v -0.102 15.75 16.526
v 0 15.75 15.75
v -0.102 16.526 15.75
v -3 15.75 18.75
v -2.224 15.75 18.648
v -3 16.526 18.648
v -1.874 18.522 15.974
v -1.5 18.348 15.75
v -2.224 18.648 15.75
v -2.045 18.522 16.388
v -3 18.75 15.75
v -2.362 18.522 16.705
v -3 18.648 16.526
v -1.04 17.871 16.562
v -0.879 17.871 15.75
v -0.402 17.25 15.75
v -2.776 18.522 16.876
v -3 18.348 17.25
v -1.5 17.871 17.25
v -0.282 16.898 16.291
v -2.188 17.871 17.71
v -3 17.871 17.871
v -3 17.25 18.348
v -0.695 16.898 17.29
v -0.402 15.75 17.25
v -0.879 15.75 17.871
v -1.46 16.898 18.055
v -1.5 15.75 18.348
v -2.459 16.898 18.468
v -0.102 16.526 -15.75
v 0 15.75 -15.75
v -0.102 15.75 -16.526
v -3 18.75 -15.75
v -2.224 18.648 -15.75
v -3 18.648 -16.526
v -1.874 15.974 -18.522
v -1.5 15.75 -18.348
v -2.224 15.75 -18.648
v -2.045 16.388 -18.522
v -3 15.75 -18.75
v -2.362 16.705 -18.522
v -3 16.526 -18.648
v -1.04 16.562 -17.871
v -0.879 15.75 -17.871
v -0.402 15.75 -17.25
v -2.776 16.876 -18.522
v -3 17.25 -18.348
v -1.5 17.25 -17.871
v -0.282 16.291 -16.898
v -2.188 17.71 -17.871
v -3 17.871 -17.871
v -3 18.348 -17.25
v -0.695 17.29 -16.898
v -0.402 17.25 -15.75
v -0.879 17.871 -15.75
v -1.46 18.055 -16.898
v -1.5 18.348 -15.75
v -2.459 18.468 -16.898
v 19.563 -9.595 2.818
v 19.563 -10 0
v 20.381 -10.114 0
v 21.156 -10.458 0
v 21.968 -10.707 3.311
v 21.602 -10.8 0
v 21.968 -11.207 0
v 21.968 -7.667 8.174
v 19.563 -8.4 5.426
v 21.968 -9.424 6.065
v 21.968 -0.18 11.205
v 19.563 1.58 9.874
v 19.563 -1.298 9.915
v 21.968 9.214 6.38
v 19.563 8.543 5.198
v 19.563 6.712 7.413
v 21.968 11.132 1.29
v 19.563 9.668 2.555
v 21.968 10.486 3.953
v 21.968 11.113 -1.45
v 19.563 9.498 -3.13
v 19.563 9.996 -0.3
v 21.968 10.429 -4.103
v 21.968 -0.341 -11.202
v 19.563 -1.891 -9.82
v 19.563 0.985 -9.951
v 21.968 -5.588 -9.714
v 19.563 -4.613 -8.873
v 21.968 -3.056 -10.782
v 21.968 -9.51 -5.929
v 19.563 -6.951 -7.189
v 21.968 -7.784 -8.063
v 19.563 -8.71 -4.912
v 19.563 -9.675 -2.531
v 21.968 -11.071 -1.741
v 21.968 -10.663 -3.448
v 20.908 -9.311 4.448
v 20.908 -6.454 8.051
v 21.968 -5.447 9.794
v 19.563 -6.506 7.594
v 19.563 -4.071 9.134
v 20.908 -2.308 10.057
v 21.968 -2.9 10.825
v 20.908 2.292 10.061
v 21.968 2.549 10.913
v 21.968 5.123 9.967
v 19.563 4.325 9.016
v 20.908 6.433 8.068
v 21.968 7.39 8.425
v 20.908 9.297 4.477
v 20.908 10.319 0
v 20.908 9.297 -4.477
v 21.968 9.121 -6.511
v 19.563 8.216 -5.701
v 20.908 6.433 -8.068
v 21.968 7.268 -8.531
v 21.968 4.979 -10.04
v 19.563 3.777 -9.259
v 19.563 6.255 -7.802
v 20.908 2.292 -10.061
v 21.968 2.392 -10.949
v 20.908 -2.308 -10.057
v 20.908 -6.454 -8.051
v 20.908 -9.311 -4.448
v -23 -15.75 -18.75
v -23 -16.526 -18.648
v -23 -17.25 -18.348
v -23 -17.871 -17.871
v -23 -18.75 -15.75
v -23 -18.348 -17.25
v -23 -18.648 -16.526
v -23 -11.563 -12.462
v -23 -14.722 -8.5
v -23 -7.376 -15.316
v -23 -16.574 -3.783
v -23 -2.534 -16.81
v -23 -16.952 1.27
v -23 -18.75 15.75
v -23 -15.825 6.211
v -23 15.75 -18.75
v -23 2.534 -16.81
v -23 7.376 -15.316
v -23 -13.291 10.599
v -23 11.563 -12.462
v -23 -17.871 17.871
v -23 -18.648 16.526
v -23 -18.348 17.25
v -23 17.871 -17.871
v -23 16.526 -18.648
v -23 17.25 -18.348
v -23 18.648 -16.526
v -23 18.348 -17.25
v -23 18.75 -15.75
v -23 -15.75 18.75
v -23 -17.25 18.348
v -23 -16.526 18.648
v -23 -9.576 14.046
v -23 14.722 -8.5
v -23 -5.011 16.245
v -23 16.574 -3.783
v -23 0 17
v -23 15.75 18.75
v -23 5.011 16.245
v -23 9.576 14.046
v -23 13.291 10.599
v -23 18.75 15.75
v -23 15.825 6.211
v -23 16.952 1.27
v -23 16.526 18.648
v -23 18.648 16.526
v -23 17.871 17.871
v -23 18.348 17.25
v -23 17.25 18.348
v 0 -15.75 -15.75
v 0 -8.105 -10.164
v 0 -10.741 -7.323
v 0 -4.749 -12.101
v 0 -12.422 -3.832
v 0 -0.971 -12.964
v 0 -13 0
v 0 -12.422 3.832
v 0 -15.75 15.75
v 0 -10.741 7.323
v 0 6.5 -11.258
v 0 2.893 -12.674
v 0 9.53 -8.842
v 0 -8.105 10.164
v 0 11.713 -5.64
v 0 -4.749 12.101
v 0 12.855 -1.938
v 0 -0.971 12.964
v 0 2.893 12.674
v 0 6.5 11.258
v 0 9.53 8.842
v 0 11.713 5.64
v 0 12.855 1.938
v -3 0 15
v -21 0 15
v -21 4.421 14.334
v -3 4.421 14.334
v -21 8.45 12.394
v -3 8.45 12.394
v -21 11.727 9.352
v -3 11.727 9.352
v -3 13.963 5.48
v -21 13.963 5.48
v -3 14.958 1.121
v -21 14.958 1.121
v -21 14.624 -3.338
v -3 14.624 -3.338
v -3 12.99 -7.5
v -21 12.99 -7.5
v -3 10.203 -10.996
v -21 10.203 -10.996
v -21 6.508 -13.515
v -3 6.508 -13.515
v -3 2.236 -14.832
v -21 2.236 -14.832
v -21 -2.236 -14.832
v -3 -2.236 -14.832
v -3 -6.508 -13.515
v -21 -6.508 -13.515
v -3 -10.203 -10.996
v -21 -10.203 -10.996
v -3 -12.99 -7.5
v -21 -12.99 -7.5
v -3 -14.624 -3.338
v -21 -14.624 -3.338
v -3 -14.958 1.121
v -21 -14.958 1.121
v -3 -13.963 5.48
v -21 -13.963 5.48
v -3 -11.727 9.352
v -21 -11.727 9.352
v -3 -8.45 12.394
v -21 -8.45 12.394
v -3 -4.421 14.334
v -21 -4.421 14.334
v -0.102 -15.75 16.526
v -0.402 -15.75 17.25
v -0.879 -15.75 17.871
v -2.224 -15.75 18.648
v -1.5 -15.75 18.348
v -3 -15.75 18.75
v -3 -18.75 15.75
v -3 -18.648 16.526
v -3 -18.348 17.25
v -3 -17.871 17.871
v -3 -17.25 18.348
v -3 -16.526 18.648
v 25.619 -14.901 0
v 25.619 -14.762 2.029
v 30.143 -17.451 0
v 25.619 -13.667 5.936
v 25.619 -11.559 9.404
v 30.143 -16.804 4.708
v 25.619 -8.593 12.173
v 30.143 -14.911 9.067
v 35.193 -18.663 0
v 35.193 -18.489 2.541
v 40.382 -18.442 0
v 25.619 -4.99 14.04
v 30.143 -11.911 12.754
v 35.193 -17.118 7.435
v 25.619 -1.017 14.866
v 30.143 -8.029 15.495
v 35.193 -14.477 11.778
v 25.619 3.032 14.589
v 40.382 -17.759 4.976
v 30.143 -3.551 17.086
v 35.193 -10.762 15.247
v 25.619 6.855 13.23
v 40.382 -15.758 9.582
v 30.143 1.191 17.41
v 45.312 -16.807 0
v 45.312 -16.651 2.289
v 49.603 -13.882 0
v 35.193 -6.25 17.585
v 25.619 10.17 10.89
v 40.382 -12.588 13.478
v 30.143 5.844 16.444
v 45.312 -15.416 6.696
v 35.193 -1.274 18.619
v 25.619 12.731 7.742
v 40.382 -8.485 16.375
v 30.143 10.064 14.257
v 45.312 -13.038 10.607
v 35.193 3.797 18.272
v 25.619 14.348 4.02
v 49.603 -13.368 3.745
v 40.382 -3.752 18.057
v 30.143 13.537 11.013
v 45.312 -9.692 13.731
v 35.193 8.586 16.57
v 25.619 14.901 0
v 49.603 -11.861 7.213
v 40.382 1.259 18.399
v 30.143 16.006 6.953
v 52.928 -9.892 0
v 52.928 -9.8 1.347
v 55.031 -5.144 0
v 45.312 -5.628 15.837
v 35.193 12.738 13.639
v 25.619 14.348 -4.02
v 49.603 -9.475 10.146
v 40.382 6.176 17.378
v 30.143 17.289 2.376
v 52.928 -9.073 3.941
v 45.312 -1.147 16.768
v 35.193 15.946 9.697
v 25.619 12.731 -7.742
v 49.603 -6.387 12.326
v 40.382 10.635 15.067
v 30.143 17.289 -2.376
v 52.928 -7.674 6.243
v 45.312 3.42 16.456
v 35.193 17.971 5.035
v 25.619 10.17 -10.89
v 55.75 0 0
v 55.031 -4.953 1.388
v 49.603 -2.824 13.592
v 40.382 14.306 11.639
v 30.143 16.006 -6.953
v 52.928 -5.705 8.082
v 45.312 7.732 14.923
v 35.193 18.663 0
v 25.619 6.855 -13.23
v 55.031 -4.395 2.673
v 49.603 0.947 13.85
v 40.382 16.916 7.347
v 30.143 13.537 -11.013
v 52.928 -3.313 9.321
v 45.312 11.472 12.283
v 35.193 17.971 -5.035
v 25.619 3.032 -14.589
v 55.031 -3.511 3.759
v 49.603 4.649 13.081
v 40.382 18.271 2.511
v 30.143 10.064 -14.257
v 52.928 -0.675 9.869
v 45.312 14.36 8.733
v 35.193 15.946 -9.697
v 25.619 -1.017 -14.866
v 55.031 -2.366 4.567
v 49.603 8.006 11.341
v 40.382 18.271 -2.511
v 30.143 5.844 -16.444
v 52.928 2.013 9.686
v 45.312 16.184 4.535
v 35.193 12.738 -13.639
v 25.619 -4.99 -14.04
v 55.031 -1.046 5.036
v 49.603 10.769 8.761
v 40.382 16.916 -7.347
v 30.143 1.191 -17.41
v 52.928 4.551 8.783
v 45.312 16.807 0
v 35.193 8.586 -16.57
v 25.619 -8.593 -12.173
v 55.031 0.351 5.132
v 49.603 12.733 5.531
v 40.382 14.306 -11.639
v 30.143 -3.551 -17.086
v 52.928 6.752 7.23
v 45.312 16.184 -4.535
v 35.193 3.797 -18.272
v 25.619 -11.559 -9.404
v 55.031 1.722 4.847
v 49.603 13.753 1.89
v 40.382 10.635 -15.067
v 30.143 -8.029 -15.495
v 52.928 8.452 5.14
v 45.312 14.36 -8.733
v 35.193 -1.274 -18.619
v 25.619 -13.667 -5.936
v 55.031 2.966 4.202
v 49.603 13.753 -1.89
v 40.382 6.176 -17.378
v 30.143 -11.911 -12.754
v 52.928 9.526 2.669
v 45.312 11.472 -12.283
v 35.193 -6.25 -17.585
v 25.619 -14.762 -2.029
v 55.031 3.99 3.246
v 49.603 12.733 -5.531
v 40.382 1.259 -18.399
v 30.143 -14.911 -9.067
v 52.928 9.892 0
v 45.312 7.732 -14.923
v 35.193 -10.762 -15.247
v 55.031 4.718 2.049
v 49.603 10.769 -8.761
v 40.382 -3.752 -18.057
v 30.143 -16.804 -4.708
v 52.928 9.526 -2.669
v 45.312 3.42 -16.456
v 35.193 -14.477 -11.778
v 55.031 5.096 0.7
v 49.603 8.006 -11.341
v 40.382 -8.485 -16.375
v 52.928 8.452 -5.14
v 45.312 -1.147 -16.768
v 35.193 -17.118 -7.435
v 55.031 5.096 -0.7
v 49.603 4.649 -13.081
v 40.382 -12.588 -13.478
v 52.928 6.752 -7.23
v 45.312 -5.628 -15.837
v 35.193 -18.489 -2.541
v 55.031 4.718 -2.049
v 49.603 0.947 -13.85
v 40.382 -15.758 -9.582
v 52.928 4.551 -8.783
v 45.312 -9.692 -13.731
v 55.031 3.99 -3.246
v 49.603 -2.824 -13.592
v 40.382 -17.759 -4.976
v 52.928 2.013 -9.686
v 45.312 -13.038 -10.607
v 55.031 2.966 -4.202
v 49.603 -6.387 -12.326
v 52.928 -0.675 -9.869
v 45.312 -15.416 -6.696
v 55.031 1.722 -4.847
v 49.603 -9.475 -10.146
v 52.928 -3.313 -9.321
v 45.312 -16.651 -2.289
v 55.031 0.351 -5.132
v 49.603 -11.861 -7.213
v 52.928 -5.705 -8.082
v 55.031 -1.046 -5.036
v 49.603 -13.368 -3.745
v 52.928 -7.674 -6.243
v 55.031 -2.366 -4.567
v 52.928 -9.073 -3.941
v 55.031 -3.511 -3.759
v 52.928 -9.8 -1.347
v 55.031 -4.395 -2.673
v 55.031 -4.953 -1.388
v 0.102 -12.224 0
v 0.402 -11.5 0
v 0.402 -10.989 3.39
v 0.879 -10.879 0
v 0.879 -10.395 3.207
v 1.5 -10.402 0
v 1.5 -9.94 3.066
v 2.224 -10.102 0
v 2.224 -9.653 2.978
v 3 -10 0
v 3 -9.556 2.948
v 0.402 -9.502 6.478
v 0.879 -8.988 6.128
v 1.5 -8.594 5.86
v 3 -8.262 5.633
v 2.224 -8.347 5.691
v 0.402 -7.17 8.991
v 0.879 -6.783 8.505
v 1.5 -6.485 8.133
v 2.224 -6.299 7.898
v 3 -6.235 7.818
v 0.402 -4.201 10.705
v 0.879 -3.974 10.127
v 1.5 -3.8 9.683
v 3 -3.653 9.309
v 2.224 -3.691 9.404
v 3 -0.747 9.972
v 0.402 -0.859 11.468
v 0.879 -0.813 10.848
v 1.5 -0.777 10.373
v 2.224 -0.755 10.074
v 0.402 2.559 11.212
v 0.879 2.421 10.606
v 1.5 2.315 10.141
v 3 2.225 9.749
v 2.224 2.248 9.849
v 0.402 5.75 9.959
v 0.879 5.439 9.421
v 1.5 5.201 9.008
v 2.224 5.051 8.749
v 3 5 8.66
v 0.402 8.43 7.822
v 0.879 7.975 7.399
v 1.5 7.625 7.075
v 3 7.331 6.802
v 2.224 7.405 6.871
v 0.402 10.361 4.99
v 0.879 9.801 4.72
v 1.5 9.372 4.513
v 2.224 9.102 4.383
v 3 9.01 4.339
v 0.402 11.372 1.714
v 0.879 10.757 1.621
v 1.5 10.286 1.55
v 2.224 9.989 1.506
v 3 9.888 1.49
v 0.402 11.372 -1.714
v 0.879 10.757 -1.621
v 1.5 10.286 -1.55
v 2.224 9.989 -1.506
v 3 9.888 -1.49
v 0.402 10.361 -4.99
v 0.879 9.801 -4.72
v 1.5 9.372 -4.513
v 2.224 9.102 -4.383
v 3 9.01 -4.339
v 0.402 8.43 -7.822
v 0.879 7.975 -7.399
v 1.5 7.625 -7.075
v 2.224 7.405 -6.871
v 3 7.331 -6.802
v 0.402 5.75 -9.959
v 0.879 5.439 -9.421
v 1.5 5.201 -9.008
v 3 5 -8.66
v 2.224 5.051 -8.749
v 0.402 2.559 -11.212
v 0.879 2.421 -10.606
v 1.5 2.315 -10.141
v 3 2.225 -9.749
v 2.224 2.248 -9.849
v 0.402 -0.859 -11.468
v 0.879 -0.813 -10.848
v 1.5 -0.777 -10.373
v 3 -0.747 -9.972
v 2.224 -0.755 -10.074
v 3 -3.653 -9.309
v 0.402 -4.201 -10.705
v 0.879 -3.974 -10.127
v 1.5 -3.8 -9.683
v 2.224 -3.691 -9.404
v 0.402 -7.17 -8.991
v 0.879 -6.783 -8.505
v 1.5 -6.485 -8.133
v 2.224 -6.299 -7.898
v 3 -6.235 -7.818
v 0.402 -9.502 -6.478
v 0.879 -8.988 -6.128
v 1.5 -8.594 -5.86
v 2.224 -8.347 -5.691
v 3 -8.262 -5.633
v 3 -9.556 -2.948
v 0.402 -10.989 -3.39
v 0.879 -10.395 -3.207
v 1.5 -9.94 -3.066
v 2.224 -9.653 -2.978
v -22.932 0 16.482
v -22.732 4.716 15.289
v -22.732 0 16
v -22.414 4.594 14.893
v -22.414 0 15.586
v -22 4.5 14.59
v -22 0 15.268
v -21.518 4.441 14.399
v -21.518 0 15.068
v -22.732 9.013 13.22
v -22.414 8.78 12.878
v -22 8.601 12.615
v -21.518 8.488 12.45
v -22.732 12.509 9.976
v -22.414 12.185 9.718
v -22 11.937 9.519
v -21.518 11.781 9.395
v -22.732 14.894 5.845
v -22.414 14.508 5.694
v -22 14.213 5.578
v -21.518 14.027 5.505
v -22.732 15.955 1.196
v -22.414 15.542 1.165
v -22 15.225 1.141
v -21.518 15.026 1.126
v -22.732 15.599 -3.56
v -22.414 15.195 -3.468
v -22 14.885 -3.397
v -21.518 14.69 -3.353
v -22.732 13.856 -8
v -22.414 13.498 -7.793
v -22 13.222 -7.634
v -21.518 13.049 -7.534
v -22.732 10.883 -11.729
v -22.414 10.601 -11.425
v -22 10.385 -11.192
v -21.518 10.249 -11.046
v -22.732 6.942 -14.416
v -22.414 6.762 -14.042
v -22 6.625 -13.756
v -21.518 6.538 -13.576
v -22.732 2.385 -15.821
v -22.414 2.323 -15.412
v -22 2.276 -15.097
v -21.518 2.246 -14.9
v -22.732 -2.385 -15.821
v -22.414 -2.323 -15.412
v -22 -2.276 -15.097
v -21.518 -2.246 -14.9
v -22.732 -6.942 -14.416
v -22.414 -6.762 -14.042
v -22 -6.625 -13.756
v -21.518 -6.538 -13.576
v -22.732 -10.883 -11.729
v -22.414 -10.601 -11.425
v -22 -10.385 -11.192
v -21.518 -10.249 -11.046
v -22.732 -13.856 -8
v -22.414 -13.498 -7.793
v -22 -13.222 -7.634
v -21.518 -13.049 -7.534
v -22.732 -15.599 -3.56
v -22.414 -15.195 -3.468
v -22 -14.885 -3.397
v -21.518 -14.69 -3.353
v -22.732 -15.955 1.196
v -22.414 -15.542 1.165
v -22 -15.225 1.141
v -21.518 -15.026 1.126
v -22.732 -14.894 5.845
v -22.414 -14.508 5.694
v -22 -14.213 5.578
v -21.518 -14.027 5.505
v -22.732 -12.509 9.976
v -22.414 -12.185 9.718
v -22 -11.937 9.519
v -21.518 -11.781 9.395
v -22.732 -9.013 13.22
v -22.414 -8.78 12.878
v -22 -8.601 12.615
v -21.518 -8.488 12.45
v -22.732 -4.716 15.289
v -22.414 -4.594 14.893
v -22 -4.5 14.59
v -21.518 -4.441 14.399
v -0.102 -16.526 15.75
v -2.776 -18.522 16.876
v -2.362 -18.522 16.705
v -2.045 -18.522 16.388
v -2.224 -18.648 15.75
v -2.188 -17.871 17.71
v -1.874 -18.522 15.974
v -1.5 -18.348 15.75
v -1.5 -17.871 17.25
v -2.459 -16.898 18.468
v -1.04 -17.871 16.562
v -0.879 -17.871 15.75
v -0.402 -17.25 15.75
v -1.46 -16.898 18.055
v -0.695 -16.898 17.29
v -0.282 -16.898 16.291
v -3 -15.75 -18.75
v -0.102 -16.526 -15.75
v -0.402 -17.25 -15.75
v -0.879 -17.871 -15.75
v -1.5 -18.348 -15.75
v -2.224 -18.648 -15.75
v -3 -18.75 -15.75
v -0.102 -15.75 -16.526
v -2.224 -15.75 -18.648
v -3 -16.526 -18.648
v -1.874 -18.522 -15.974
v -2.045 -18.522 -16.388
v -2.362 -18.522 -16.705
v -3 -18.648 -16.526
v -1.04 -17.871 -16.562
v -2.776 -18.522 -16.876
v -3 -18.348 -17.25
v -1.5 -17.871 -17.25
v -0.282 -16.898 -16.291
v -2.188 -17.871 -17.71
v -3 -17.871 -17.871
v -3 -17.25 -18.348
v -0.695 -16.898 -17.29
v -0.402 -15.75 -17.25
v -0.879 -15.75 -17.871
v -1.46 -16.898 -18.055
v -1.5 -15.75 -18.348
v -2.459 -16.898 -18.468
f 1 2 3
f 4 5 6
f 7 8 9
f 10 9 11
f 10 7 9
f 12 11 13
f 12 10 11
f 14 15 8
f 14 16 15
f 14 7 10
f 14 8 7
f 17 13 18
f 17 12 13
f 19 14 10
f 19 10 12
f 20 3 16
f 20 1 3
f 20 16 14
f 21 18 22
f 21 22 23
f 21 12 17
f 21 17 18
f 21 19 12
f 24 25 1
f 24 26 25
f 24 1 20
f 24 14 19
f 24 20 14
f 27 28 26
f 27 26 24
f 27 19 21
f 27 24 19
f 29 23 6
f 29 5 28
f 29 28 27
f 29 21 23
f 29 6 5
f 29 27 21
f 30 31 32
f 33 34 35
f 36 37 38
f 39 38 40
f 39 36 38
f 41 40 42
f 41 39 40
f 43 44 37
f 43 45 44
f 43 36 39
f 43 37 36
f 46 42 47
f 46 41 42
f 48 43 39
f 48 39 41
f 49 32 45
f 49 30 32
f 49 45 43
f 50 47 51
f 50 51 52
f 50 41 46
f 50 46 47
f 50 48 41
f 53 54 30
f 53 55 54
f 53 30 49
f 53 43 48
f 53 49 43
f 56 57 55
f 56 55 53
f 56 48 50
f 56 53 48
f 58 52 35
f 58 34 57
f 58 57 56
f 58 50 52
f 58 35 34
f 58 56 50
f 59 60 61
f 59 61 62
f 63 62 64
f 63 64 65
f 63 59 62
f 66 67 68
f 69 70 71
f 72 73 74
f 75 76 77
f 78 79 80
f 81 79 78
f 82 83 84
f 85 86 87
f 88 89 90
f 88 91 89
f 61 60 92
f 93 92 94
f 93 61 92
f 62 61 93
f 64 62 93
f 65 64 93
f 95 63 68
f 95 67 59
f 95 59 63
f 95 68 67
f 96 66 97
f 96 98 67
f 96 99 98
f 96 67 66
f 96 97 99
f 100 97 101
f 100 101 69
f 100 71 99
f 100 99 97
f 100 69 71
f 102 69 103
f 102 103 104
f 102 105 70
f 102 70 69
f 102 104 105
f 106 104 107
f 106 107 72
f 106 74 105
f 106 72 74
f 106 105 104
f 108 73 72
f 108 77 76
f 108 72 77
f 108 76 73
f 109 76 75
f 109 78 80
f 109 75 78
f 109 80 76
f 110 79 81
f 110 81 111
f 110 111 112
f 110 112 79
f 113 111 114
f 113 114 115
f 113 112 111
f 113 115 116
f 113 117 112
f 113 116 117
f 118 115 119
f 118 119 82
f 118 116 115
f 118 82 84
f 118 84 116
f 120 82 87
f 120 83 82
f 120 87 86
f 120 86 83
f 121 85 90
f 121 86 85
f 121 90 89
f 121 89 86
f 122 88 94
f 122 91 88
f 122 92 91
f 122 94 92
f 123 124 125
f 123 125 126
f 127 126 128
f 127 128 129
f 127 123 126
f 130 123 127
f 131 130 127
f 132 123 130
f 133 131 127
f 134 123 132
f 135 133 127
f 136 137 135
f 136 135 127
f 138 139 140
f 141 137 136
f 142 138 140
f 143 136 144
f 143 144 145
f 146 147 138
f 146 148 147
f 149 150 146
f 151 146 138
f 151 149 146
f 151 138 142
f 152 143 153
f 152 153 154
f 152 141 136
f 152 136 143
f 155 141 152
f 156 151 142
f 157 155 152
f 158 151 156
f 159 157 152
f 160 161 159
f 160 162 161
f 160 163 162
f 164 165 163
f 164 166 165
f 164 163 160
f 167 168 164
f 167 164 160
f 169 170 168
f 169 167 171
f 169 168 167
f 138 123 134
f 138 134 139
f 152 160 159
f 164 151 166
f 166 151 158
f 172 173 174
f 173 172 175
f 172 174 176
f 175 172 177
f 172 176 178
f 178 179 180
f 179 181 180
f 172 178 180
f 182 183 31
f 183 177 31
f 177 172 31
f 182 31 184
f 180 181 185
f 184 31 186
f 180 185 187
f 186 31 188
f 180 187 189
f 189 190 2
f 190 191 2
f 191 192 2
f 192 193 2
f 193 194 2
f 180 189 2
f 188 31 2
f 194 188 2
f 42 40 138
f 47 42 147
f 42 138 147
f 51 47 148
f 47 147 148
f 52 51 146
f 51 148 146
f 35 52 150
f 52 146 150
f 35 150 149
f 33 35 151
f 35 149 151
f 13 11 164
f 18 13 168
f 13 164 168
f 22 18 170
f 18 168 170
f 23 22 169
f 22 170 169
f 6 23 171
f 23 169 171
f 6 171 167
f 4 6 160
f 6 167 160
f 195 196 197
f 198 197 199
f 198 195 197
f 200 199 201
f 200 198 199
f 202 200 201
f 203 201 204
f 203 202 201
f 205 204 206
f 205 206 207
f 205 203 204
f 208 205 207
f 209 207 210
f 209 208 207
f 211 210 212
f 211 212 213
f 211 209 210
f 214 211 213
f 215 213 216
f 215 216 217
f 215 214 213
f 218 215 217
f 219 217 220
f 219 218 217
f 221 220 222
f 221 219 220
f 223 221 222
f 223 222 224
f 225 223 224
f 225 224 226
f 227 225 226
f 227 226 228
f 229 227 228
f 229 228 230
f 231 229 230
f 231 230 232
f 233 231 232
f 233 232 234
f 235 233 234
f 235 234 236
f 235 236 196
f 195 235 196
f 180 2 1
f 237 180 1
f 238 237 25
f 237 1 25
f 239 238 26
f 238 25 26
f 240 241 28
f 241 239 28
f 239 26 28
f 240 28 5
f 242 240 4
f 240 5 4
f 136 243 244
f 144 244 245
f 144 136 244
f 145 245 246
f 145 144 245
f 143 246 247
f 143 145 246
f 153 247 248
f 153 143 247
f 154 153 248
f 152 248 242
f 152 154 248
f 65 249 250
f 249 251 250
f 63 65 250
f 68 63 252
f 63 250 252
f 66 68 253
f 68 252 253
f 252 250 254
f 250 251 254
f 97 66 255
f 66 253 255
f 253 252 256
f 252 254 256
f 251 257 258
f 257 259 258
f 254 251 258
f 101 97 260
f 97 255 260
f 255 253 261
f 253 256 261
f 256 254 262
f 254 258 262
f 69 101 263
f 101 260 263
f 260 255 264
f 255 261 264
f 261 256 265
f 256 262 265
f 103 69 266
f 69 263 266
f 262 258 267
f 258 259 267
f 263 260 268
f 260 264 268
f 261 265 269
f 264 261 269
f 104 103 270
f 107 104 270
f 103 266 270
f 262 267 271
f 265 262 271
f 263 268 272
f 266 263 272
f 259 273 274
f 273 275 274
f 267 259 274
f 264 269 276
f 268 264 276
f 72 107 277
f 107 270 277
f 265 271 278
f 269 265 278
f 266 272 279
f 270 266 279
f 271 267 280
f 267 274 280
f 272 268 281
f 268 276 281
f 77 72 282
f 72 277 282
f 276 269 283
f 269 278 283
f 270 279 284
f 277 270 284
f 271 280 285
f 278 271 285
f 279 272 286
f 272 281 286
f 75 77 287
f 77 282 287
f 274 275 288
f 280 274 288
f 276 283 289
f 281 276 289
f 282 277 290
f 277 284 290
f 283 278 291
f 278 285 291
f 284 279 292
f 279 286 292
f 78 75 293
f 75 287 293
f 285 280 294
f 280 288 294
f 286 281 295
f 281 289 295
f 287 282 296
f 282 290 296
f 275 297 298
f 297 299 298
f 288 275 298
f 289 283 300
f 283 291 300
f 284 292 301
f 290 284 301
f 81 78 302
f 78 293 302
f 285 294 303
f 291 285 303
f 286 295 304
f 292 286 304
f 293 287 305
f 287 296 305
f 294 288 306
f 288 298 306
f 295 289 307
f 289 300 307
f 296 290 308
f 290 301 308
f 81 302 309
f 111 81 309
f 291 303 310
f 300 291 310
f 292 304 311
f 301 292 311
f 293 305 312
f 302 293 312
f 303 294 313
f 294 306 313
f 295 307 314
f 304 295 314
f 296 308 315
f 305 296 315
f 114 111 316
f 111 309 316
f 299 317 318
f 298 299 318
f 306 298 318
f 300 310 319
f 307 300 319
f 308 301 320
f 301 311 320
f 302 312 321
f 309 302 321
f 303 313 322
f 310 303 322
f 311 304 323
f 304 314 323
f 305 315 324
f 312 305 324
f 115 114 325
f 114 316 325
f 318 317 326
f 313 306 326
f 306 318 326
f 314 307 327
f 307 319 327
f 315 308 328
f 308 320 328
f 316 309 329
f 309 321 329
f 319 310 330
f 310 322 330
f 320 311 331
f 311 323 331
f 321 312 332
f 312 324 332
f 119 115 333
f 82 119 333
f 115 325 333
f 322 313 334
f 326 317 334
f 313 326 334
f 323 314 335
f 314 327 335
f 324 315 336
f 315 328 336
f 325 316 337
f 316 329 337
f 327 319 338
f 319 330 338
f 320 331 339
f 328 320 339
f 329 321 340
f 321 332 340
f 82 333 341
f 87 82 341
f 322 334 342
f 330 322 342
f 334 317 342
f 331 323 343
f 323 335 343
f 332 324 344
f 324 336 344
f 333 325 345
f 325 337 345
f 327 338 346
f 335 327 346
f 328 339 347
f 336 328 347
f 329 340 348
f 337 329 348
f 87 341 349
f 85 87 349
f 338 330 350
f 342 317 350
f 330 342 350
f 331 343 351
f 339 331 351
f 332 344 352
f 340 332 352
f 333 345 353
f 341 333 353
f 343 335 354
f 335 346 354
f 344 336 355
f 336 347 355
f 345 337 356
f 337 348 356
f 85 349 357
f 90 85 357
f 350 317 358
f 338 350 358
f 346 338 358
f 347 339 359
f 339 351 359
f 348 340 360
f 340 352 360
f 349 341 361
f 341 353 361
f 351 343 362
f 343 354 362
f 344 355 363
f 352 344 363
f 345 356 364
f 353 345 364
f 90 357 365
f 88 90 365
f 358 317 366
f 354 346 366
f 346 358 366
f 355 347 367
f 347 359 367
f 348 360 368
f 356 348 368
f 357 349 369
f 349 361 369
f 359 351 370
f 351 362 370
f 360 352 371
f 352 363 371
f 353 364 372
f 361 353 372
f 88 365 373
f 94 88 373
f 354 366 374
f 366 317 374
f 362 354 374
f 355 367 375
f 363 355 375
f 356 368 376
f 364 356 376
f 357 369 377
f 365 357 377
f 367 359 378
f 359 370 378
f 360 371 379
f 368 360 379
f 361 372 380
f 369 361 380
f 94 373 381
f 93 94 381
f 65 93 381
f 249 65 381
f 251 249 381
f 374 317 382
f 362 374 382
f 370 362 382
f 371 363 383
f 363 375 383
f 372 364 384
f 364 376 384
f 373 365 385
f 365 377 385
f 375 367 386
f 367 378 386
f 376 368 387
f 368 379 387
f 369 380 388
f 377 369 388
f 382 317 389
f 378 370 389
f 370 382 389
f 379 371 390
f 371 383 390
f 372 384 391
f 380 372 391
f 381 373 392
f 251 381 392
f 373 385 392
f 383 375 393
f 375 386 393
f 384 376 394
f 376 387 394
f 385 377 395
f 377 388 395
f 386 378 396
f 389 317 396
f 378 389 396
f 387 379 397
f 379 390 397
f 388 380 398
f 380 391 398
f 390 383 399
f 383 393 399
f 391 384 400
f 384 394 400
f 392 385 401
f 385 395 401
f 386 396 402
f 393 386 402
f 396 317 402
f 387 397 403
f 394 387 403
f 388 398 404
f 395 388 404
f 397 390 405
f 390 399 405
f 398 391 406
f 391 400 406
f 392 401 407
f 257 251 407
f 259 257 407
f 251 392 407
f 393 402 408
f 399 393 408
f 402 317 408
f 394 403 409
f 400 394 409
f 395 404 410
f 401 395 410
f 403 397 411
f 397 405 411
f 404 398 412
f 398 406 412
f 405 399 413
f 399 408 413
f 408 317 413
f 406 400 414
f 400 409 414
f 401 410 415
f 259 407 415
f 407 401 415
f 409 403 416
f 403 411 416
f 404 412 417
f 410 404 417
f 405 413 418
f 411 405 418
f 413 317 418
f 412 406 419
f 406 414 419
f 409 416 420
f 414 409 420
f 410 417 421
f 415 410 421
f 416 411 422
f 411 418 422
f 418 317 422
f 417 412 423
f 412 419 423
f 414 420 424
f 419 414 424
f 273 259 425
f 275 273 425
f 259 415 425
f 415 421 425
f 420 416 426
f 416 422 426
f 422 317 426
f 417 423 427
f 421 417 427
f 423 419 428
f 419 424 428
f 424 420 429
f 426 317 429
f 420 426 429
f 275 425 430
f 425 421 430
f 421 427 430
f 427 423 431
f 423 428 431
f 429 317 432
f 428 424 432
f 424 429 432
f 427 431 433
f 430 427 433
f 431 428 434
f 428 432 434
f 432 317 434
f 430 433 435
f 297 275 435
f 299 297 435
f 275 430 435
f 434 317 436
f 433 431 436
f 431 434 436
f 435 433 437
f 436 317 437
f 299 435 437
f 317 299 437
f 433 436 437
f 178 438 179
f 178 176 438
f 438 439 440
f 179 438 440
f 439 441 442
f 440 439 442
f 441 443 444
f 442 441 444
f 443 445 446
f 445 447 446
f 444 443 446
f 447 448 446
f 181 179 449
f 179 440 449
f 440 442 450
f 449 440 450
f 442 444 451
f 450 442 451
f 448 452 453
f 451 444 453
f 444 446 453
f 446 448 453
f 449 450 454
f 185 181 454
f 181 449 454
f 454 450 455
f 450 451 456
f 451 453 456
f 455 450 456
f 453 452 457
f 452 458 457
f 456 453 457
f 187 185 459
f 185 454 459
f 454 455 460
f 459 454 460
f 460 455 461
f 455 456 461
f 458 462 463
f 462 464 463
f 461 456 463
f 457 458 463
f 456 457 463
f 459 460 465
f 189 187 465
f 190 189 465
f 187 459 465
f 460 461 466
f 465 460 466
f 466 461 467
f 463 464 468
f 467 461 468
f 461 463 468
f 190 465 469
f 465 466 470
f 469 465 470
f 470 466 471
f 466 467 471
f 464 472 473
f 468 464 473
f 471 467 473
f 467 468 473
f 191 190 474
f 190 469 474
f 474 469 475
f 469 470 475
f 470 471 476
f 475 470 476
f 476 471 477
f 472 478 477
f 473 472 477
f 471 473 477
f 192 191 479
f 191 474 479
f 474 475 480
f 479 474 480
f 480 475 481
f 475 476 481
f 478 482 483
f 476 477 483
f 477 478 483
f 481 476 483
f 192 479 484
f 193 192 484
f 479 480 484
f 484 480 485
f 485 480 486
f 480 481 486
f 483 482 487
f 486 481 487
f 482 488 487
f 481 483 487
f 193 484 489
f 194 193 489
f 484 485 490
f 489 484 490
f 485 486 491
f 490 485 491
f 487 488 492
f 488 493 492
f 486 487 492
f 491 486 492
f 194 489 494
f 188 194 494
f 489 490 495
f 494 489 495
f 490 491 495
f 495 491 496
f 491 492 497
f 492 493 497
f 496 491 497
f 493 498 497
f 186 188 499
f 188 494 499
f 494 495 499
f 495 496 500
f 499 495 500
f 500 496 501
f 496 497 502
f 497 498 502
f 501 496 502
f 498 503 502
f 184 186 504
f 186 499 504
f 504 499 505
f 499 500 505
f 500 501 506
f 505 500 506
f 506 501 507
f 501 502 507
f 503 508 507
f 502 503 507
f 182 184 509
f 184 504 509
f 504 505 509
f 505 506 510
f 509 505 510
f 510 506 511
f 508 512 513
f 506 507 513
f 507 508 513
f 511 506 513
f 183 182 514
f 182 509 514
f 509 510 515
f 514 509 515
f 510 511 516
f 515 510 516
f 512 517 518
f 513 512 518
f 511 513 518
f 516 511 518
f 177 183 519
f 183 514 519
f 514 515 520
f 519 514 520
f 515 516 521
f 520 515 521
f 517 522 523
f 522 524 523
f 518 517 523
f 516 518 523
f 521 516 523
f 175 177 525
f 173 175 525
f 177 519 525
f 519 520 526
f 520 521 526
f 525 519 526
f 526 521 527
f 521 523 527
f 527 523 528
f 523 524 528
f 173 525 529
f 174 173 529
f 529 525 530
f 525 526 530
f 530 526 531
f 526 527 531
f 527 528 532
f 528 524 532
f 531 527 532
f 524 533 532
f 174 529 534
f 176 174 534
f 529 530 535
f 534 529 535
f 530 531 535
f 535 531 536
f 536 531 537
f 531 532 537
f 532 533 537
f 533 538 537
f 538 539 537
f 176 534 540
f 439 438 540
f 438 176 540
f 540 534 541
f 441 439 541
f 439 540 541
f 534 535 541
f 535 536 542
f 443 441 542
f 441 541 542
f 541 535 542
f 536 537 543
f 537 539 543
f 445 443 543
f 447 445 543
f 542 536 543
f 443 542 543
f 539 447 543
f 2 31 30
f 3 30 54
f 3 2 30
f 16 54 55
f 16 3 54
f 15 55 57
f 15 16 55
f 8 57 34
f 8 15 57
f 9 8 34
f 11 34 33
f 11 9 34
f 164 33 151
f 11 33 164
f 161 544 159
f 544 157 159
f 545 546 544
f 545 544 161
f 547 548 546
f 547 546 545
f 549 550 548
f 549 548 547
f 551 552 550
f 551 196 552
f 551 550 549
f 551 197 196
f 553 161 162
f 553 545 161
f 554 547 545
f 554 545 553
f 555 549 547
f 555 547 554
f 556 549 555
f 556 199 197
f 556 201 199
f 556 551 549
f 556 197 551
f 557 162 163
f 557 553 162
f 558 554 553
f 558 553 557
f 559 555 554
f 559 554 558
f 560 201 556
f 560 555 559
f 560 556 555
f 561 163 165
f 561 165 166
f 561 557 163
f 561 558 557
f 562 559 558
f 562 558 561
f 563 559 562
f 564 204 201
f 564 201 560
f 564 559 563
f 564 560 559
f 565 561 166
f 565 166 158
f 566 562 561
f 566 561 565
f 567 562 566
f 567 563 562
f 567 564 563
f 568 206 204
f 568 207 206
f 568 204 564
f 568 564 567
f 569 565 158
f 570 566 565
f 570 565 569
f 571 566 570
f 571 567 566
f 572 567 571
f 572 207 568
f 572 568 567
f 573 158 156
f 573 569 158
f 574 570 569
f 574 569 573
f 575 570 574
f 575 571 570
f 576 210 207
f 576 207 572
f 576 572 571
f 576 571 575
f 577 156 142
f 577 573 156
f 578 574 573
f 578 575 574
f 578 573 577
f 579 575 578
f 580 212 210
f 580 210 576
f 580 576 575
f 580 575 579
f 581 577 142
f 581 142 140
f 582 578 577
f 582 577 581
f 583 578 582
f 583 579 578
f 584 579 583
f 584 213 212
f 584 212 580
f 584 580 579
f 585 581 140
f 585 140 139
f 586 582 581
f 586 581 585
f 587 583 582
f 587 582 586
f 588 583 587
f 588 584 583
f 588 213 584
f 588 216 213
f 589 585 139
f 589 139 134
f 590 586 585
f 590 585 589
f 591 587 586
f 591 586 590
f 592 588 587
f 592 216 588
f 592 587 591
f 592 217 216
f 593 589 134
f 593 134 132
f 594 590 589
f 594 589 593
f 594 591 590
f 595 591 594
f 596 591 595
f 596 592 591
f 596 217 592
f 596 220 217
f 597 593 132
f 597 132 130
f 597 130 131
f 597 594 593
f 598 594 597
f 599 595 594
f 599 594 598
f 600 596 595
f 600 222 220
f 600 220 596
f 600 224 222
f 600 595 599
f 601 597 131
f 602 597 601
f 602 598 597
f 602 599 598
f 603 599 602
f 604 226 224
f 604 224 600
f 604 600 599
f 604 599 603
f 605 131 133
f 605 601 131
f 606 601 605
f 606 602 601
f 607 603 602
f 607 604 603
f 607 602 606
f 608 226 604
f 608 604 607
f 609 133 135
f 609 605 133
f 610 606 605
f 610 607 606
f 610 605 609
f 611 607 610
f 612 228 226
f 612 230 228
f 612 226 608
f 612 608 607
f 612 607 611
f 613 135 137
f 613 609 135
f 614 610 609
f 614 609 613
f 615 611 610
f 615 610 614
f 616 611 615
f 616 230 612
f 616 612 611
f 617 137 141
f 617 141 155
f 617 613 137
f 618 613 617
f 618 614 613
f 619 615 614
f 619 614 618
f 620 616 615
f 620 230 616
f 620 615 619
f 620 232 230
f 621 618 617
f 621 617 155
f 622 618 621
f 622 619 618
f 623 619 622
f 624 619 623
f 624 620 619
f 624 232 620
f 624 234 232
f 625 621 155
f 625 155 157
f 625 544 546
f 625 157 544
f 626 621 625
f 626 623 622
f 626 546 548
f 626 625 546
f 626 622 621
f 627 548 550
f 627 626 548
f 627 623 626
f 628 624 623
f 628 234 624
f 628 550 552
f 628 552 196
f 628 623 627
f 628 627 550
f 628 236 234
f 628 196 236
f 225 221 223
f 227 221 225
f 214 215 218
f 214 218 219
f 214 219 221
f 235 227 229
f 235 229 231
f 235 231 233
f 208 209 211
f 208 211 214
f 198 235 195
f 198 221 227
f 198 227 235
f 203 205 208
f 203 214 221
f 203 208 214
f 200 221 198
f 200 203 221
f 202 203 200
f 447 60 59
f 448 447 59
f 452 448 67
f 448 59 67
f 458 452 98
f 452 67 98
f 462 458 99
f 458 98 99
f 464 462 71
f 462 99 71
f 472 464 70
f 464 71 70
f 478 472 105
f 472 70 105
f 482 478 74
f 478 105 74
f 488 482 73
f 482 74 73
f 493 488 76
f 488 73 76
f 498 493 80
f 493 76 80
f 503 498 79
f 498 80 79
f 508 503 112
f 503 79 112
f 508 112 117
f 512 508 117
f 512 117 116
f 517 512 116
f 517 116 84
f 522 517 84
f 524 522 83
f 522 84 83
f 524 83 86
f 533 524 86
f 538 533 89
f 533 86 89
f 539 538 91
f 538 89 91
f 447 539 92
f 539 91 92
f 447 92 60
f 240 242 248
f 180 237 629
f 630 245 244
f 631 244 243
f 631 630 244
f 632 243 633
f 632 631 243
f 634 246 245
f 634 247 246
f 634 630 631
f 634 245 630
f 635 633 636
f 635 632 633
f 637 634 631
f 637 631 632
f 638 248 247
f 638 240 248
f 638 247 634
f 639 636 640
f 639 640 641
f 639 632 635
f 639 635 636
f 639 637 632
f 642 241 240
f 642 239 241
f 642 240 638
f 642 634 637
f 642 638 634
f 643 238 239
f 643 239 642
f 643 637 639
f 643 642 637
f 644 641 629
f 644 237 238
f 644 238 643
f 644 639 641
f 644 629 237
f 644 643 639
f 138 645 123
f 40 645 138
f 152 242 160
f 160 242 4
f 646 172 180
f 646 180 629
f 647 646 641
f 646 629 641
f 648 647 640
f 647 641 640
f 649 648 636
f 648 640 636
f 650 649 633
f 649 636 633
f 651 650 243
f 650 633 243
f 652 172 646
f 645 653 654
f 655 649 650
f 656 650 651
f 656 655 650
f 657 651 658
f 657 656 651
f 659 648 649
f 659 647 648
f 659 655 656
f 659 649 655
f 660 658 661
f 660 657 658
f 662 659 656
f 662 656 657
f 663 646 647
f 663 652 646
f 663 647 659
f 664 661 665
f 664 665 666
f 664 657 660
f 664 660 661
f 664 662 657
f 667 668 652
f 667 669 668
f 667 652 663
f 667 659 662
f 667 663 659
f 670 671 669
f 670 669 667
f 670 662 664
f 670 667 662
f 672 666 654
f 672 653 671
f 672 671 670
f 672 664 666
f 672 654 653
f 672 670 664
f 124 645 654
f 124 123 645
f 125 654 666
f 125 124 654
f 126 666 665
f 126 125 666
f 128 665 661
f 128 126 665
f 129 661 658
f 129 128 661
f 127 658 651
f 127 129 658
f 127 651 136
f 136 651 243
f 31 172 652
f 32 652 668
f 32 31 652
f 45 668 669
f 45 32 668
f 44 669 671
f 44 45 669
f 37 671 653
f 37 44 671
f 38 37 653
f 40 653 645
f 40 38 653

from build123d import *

# Parameters (mm, degrees)
SKETCH2_W           = 37.5
SKETCH2_H           = 37.5
SKETCH2_R           = 15
BOSS_EXTRUDE1_DEPTH = 23
SKETCH3_R           = 15
BOSS_EXTRUDE2_DEPTH = 3
FILLET2_R           = 3
FILLET3_R           = 2


with BuildPart() as part:
    # Sketch1 → Revolve1 (revolve)
    with BuildSketch(Plane.XY, mode=Mode.PRIVATE) as revolve1_sk:
        with BuildLine():
            Line((0, 10), (21.139278074, 10))
            ThreePointArc((21.139278074, 10), (42.204515534, 18.013203992), (55.75, 0))
            Line((55.75, 0), (0, 0))
            Line((0, 0), (0, 10))
        make_face()
    revolve(revolve1_sk.sketch.rotate(Axis((55.75, 0, 0), (-1, 0, 0)), 180), axis=Axis((55.75, 0, 0), (-1, 0, 0)))



with BuildPart() as body_2:
    # Sketch2 → Boss-Extrude1 (new body)
    with BuildSketch(Plane.ZY):
        Rectangle(SKETCH2_W, SKETCH2_H)
        Circle(SKETCH2_R, mode=Mode.SUBTRACT)
    extrude(amount=BOSS_EXTRUDE1_DEPTH)


with BuildPart() as part_1:
    add(part.part)

    add(body_2.part)  # Boss-Extrude2 merges body 2
    # Sketch3 → Boss-Extrude2 (add)
    with BuildSketch(Plane.ZY):
        Circle(SKETCH3_R)
    extrude(amount=BOSS_EXTRUDE2_DEPTH)

    # Fillet2
    fillet2_edges = [part_1.edges().sort_by_distance(p)[0] for p in [
        (0, 10, 0),
        (0, 0, 18.75),
        (-11.5, -18.75, 18.75),
        (0, 18.75, 0),
        (-11.5, 18.75, 18.75),
        (0, 0, -18.75),
        (-11.5, 18.75, -18.75),
        (0, -18.75, 0),
        (-11.5, -18.75, -18.75),
        (21.139278074, 10, 0),
    ]]
    fillet(fillet2_edges, radius=FILLET2_R)

    # Fillet3
    fillet3_edges = [part_1.edges().sort_by_distance(p)[0] for p in [
        (-23, 0, -15),
    ]]
    fillet(fillet3_edges, radius=FILLET3_R)


solid = part_1.part
